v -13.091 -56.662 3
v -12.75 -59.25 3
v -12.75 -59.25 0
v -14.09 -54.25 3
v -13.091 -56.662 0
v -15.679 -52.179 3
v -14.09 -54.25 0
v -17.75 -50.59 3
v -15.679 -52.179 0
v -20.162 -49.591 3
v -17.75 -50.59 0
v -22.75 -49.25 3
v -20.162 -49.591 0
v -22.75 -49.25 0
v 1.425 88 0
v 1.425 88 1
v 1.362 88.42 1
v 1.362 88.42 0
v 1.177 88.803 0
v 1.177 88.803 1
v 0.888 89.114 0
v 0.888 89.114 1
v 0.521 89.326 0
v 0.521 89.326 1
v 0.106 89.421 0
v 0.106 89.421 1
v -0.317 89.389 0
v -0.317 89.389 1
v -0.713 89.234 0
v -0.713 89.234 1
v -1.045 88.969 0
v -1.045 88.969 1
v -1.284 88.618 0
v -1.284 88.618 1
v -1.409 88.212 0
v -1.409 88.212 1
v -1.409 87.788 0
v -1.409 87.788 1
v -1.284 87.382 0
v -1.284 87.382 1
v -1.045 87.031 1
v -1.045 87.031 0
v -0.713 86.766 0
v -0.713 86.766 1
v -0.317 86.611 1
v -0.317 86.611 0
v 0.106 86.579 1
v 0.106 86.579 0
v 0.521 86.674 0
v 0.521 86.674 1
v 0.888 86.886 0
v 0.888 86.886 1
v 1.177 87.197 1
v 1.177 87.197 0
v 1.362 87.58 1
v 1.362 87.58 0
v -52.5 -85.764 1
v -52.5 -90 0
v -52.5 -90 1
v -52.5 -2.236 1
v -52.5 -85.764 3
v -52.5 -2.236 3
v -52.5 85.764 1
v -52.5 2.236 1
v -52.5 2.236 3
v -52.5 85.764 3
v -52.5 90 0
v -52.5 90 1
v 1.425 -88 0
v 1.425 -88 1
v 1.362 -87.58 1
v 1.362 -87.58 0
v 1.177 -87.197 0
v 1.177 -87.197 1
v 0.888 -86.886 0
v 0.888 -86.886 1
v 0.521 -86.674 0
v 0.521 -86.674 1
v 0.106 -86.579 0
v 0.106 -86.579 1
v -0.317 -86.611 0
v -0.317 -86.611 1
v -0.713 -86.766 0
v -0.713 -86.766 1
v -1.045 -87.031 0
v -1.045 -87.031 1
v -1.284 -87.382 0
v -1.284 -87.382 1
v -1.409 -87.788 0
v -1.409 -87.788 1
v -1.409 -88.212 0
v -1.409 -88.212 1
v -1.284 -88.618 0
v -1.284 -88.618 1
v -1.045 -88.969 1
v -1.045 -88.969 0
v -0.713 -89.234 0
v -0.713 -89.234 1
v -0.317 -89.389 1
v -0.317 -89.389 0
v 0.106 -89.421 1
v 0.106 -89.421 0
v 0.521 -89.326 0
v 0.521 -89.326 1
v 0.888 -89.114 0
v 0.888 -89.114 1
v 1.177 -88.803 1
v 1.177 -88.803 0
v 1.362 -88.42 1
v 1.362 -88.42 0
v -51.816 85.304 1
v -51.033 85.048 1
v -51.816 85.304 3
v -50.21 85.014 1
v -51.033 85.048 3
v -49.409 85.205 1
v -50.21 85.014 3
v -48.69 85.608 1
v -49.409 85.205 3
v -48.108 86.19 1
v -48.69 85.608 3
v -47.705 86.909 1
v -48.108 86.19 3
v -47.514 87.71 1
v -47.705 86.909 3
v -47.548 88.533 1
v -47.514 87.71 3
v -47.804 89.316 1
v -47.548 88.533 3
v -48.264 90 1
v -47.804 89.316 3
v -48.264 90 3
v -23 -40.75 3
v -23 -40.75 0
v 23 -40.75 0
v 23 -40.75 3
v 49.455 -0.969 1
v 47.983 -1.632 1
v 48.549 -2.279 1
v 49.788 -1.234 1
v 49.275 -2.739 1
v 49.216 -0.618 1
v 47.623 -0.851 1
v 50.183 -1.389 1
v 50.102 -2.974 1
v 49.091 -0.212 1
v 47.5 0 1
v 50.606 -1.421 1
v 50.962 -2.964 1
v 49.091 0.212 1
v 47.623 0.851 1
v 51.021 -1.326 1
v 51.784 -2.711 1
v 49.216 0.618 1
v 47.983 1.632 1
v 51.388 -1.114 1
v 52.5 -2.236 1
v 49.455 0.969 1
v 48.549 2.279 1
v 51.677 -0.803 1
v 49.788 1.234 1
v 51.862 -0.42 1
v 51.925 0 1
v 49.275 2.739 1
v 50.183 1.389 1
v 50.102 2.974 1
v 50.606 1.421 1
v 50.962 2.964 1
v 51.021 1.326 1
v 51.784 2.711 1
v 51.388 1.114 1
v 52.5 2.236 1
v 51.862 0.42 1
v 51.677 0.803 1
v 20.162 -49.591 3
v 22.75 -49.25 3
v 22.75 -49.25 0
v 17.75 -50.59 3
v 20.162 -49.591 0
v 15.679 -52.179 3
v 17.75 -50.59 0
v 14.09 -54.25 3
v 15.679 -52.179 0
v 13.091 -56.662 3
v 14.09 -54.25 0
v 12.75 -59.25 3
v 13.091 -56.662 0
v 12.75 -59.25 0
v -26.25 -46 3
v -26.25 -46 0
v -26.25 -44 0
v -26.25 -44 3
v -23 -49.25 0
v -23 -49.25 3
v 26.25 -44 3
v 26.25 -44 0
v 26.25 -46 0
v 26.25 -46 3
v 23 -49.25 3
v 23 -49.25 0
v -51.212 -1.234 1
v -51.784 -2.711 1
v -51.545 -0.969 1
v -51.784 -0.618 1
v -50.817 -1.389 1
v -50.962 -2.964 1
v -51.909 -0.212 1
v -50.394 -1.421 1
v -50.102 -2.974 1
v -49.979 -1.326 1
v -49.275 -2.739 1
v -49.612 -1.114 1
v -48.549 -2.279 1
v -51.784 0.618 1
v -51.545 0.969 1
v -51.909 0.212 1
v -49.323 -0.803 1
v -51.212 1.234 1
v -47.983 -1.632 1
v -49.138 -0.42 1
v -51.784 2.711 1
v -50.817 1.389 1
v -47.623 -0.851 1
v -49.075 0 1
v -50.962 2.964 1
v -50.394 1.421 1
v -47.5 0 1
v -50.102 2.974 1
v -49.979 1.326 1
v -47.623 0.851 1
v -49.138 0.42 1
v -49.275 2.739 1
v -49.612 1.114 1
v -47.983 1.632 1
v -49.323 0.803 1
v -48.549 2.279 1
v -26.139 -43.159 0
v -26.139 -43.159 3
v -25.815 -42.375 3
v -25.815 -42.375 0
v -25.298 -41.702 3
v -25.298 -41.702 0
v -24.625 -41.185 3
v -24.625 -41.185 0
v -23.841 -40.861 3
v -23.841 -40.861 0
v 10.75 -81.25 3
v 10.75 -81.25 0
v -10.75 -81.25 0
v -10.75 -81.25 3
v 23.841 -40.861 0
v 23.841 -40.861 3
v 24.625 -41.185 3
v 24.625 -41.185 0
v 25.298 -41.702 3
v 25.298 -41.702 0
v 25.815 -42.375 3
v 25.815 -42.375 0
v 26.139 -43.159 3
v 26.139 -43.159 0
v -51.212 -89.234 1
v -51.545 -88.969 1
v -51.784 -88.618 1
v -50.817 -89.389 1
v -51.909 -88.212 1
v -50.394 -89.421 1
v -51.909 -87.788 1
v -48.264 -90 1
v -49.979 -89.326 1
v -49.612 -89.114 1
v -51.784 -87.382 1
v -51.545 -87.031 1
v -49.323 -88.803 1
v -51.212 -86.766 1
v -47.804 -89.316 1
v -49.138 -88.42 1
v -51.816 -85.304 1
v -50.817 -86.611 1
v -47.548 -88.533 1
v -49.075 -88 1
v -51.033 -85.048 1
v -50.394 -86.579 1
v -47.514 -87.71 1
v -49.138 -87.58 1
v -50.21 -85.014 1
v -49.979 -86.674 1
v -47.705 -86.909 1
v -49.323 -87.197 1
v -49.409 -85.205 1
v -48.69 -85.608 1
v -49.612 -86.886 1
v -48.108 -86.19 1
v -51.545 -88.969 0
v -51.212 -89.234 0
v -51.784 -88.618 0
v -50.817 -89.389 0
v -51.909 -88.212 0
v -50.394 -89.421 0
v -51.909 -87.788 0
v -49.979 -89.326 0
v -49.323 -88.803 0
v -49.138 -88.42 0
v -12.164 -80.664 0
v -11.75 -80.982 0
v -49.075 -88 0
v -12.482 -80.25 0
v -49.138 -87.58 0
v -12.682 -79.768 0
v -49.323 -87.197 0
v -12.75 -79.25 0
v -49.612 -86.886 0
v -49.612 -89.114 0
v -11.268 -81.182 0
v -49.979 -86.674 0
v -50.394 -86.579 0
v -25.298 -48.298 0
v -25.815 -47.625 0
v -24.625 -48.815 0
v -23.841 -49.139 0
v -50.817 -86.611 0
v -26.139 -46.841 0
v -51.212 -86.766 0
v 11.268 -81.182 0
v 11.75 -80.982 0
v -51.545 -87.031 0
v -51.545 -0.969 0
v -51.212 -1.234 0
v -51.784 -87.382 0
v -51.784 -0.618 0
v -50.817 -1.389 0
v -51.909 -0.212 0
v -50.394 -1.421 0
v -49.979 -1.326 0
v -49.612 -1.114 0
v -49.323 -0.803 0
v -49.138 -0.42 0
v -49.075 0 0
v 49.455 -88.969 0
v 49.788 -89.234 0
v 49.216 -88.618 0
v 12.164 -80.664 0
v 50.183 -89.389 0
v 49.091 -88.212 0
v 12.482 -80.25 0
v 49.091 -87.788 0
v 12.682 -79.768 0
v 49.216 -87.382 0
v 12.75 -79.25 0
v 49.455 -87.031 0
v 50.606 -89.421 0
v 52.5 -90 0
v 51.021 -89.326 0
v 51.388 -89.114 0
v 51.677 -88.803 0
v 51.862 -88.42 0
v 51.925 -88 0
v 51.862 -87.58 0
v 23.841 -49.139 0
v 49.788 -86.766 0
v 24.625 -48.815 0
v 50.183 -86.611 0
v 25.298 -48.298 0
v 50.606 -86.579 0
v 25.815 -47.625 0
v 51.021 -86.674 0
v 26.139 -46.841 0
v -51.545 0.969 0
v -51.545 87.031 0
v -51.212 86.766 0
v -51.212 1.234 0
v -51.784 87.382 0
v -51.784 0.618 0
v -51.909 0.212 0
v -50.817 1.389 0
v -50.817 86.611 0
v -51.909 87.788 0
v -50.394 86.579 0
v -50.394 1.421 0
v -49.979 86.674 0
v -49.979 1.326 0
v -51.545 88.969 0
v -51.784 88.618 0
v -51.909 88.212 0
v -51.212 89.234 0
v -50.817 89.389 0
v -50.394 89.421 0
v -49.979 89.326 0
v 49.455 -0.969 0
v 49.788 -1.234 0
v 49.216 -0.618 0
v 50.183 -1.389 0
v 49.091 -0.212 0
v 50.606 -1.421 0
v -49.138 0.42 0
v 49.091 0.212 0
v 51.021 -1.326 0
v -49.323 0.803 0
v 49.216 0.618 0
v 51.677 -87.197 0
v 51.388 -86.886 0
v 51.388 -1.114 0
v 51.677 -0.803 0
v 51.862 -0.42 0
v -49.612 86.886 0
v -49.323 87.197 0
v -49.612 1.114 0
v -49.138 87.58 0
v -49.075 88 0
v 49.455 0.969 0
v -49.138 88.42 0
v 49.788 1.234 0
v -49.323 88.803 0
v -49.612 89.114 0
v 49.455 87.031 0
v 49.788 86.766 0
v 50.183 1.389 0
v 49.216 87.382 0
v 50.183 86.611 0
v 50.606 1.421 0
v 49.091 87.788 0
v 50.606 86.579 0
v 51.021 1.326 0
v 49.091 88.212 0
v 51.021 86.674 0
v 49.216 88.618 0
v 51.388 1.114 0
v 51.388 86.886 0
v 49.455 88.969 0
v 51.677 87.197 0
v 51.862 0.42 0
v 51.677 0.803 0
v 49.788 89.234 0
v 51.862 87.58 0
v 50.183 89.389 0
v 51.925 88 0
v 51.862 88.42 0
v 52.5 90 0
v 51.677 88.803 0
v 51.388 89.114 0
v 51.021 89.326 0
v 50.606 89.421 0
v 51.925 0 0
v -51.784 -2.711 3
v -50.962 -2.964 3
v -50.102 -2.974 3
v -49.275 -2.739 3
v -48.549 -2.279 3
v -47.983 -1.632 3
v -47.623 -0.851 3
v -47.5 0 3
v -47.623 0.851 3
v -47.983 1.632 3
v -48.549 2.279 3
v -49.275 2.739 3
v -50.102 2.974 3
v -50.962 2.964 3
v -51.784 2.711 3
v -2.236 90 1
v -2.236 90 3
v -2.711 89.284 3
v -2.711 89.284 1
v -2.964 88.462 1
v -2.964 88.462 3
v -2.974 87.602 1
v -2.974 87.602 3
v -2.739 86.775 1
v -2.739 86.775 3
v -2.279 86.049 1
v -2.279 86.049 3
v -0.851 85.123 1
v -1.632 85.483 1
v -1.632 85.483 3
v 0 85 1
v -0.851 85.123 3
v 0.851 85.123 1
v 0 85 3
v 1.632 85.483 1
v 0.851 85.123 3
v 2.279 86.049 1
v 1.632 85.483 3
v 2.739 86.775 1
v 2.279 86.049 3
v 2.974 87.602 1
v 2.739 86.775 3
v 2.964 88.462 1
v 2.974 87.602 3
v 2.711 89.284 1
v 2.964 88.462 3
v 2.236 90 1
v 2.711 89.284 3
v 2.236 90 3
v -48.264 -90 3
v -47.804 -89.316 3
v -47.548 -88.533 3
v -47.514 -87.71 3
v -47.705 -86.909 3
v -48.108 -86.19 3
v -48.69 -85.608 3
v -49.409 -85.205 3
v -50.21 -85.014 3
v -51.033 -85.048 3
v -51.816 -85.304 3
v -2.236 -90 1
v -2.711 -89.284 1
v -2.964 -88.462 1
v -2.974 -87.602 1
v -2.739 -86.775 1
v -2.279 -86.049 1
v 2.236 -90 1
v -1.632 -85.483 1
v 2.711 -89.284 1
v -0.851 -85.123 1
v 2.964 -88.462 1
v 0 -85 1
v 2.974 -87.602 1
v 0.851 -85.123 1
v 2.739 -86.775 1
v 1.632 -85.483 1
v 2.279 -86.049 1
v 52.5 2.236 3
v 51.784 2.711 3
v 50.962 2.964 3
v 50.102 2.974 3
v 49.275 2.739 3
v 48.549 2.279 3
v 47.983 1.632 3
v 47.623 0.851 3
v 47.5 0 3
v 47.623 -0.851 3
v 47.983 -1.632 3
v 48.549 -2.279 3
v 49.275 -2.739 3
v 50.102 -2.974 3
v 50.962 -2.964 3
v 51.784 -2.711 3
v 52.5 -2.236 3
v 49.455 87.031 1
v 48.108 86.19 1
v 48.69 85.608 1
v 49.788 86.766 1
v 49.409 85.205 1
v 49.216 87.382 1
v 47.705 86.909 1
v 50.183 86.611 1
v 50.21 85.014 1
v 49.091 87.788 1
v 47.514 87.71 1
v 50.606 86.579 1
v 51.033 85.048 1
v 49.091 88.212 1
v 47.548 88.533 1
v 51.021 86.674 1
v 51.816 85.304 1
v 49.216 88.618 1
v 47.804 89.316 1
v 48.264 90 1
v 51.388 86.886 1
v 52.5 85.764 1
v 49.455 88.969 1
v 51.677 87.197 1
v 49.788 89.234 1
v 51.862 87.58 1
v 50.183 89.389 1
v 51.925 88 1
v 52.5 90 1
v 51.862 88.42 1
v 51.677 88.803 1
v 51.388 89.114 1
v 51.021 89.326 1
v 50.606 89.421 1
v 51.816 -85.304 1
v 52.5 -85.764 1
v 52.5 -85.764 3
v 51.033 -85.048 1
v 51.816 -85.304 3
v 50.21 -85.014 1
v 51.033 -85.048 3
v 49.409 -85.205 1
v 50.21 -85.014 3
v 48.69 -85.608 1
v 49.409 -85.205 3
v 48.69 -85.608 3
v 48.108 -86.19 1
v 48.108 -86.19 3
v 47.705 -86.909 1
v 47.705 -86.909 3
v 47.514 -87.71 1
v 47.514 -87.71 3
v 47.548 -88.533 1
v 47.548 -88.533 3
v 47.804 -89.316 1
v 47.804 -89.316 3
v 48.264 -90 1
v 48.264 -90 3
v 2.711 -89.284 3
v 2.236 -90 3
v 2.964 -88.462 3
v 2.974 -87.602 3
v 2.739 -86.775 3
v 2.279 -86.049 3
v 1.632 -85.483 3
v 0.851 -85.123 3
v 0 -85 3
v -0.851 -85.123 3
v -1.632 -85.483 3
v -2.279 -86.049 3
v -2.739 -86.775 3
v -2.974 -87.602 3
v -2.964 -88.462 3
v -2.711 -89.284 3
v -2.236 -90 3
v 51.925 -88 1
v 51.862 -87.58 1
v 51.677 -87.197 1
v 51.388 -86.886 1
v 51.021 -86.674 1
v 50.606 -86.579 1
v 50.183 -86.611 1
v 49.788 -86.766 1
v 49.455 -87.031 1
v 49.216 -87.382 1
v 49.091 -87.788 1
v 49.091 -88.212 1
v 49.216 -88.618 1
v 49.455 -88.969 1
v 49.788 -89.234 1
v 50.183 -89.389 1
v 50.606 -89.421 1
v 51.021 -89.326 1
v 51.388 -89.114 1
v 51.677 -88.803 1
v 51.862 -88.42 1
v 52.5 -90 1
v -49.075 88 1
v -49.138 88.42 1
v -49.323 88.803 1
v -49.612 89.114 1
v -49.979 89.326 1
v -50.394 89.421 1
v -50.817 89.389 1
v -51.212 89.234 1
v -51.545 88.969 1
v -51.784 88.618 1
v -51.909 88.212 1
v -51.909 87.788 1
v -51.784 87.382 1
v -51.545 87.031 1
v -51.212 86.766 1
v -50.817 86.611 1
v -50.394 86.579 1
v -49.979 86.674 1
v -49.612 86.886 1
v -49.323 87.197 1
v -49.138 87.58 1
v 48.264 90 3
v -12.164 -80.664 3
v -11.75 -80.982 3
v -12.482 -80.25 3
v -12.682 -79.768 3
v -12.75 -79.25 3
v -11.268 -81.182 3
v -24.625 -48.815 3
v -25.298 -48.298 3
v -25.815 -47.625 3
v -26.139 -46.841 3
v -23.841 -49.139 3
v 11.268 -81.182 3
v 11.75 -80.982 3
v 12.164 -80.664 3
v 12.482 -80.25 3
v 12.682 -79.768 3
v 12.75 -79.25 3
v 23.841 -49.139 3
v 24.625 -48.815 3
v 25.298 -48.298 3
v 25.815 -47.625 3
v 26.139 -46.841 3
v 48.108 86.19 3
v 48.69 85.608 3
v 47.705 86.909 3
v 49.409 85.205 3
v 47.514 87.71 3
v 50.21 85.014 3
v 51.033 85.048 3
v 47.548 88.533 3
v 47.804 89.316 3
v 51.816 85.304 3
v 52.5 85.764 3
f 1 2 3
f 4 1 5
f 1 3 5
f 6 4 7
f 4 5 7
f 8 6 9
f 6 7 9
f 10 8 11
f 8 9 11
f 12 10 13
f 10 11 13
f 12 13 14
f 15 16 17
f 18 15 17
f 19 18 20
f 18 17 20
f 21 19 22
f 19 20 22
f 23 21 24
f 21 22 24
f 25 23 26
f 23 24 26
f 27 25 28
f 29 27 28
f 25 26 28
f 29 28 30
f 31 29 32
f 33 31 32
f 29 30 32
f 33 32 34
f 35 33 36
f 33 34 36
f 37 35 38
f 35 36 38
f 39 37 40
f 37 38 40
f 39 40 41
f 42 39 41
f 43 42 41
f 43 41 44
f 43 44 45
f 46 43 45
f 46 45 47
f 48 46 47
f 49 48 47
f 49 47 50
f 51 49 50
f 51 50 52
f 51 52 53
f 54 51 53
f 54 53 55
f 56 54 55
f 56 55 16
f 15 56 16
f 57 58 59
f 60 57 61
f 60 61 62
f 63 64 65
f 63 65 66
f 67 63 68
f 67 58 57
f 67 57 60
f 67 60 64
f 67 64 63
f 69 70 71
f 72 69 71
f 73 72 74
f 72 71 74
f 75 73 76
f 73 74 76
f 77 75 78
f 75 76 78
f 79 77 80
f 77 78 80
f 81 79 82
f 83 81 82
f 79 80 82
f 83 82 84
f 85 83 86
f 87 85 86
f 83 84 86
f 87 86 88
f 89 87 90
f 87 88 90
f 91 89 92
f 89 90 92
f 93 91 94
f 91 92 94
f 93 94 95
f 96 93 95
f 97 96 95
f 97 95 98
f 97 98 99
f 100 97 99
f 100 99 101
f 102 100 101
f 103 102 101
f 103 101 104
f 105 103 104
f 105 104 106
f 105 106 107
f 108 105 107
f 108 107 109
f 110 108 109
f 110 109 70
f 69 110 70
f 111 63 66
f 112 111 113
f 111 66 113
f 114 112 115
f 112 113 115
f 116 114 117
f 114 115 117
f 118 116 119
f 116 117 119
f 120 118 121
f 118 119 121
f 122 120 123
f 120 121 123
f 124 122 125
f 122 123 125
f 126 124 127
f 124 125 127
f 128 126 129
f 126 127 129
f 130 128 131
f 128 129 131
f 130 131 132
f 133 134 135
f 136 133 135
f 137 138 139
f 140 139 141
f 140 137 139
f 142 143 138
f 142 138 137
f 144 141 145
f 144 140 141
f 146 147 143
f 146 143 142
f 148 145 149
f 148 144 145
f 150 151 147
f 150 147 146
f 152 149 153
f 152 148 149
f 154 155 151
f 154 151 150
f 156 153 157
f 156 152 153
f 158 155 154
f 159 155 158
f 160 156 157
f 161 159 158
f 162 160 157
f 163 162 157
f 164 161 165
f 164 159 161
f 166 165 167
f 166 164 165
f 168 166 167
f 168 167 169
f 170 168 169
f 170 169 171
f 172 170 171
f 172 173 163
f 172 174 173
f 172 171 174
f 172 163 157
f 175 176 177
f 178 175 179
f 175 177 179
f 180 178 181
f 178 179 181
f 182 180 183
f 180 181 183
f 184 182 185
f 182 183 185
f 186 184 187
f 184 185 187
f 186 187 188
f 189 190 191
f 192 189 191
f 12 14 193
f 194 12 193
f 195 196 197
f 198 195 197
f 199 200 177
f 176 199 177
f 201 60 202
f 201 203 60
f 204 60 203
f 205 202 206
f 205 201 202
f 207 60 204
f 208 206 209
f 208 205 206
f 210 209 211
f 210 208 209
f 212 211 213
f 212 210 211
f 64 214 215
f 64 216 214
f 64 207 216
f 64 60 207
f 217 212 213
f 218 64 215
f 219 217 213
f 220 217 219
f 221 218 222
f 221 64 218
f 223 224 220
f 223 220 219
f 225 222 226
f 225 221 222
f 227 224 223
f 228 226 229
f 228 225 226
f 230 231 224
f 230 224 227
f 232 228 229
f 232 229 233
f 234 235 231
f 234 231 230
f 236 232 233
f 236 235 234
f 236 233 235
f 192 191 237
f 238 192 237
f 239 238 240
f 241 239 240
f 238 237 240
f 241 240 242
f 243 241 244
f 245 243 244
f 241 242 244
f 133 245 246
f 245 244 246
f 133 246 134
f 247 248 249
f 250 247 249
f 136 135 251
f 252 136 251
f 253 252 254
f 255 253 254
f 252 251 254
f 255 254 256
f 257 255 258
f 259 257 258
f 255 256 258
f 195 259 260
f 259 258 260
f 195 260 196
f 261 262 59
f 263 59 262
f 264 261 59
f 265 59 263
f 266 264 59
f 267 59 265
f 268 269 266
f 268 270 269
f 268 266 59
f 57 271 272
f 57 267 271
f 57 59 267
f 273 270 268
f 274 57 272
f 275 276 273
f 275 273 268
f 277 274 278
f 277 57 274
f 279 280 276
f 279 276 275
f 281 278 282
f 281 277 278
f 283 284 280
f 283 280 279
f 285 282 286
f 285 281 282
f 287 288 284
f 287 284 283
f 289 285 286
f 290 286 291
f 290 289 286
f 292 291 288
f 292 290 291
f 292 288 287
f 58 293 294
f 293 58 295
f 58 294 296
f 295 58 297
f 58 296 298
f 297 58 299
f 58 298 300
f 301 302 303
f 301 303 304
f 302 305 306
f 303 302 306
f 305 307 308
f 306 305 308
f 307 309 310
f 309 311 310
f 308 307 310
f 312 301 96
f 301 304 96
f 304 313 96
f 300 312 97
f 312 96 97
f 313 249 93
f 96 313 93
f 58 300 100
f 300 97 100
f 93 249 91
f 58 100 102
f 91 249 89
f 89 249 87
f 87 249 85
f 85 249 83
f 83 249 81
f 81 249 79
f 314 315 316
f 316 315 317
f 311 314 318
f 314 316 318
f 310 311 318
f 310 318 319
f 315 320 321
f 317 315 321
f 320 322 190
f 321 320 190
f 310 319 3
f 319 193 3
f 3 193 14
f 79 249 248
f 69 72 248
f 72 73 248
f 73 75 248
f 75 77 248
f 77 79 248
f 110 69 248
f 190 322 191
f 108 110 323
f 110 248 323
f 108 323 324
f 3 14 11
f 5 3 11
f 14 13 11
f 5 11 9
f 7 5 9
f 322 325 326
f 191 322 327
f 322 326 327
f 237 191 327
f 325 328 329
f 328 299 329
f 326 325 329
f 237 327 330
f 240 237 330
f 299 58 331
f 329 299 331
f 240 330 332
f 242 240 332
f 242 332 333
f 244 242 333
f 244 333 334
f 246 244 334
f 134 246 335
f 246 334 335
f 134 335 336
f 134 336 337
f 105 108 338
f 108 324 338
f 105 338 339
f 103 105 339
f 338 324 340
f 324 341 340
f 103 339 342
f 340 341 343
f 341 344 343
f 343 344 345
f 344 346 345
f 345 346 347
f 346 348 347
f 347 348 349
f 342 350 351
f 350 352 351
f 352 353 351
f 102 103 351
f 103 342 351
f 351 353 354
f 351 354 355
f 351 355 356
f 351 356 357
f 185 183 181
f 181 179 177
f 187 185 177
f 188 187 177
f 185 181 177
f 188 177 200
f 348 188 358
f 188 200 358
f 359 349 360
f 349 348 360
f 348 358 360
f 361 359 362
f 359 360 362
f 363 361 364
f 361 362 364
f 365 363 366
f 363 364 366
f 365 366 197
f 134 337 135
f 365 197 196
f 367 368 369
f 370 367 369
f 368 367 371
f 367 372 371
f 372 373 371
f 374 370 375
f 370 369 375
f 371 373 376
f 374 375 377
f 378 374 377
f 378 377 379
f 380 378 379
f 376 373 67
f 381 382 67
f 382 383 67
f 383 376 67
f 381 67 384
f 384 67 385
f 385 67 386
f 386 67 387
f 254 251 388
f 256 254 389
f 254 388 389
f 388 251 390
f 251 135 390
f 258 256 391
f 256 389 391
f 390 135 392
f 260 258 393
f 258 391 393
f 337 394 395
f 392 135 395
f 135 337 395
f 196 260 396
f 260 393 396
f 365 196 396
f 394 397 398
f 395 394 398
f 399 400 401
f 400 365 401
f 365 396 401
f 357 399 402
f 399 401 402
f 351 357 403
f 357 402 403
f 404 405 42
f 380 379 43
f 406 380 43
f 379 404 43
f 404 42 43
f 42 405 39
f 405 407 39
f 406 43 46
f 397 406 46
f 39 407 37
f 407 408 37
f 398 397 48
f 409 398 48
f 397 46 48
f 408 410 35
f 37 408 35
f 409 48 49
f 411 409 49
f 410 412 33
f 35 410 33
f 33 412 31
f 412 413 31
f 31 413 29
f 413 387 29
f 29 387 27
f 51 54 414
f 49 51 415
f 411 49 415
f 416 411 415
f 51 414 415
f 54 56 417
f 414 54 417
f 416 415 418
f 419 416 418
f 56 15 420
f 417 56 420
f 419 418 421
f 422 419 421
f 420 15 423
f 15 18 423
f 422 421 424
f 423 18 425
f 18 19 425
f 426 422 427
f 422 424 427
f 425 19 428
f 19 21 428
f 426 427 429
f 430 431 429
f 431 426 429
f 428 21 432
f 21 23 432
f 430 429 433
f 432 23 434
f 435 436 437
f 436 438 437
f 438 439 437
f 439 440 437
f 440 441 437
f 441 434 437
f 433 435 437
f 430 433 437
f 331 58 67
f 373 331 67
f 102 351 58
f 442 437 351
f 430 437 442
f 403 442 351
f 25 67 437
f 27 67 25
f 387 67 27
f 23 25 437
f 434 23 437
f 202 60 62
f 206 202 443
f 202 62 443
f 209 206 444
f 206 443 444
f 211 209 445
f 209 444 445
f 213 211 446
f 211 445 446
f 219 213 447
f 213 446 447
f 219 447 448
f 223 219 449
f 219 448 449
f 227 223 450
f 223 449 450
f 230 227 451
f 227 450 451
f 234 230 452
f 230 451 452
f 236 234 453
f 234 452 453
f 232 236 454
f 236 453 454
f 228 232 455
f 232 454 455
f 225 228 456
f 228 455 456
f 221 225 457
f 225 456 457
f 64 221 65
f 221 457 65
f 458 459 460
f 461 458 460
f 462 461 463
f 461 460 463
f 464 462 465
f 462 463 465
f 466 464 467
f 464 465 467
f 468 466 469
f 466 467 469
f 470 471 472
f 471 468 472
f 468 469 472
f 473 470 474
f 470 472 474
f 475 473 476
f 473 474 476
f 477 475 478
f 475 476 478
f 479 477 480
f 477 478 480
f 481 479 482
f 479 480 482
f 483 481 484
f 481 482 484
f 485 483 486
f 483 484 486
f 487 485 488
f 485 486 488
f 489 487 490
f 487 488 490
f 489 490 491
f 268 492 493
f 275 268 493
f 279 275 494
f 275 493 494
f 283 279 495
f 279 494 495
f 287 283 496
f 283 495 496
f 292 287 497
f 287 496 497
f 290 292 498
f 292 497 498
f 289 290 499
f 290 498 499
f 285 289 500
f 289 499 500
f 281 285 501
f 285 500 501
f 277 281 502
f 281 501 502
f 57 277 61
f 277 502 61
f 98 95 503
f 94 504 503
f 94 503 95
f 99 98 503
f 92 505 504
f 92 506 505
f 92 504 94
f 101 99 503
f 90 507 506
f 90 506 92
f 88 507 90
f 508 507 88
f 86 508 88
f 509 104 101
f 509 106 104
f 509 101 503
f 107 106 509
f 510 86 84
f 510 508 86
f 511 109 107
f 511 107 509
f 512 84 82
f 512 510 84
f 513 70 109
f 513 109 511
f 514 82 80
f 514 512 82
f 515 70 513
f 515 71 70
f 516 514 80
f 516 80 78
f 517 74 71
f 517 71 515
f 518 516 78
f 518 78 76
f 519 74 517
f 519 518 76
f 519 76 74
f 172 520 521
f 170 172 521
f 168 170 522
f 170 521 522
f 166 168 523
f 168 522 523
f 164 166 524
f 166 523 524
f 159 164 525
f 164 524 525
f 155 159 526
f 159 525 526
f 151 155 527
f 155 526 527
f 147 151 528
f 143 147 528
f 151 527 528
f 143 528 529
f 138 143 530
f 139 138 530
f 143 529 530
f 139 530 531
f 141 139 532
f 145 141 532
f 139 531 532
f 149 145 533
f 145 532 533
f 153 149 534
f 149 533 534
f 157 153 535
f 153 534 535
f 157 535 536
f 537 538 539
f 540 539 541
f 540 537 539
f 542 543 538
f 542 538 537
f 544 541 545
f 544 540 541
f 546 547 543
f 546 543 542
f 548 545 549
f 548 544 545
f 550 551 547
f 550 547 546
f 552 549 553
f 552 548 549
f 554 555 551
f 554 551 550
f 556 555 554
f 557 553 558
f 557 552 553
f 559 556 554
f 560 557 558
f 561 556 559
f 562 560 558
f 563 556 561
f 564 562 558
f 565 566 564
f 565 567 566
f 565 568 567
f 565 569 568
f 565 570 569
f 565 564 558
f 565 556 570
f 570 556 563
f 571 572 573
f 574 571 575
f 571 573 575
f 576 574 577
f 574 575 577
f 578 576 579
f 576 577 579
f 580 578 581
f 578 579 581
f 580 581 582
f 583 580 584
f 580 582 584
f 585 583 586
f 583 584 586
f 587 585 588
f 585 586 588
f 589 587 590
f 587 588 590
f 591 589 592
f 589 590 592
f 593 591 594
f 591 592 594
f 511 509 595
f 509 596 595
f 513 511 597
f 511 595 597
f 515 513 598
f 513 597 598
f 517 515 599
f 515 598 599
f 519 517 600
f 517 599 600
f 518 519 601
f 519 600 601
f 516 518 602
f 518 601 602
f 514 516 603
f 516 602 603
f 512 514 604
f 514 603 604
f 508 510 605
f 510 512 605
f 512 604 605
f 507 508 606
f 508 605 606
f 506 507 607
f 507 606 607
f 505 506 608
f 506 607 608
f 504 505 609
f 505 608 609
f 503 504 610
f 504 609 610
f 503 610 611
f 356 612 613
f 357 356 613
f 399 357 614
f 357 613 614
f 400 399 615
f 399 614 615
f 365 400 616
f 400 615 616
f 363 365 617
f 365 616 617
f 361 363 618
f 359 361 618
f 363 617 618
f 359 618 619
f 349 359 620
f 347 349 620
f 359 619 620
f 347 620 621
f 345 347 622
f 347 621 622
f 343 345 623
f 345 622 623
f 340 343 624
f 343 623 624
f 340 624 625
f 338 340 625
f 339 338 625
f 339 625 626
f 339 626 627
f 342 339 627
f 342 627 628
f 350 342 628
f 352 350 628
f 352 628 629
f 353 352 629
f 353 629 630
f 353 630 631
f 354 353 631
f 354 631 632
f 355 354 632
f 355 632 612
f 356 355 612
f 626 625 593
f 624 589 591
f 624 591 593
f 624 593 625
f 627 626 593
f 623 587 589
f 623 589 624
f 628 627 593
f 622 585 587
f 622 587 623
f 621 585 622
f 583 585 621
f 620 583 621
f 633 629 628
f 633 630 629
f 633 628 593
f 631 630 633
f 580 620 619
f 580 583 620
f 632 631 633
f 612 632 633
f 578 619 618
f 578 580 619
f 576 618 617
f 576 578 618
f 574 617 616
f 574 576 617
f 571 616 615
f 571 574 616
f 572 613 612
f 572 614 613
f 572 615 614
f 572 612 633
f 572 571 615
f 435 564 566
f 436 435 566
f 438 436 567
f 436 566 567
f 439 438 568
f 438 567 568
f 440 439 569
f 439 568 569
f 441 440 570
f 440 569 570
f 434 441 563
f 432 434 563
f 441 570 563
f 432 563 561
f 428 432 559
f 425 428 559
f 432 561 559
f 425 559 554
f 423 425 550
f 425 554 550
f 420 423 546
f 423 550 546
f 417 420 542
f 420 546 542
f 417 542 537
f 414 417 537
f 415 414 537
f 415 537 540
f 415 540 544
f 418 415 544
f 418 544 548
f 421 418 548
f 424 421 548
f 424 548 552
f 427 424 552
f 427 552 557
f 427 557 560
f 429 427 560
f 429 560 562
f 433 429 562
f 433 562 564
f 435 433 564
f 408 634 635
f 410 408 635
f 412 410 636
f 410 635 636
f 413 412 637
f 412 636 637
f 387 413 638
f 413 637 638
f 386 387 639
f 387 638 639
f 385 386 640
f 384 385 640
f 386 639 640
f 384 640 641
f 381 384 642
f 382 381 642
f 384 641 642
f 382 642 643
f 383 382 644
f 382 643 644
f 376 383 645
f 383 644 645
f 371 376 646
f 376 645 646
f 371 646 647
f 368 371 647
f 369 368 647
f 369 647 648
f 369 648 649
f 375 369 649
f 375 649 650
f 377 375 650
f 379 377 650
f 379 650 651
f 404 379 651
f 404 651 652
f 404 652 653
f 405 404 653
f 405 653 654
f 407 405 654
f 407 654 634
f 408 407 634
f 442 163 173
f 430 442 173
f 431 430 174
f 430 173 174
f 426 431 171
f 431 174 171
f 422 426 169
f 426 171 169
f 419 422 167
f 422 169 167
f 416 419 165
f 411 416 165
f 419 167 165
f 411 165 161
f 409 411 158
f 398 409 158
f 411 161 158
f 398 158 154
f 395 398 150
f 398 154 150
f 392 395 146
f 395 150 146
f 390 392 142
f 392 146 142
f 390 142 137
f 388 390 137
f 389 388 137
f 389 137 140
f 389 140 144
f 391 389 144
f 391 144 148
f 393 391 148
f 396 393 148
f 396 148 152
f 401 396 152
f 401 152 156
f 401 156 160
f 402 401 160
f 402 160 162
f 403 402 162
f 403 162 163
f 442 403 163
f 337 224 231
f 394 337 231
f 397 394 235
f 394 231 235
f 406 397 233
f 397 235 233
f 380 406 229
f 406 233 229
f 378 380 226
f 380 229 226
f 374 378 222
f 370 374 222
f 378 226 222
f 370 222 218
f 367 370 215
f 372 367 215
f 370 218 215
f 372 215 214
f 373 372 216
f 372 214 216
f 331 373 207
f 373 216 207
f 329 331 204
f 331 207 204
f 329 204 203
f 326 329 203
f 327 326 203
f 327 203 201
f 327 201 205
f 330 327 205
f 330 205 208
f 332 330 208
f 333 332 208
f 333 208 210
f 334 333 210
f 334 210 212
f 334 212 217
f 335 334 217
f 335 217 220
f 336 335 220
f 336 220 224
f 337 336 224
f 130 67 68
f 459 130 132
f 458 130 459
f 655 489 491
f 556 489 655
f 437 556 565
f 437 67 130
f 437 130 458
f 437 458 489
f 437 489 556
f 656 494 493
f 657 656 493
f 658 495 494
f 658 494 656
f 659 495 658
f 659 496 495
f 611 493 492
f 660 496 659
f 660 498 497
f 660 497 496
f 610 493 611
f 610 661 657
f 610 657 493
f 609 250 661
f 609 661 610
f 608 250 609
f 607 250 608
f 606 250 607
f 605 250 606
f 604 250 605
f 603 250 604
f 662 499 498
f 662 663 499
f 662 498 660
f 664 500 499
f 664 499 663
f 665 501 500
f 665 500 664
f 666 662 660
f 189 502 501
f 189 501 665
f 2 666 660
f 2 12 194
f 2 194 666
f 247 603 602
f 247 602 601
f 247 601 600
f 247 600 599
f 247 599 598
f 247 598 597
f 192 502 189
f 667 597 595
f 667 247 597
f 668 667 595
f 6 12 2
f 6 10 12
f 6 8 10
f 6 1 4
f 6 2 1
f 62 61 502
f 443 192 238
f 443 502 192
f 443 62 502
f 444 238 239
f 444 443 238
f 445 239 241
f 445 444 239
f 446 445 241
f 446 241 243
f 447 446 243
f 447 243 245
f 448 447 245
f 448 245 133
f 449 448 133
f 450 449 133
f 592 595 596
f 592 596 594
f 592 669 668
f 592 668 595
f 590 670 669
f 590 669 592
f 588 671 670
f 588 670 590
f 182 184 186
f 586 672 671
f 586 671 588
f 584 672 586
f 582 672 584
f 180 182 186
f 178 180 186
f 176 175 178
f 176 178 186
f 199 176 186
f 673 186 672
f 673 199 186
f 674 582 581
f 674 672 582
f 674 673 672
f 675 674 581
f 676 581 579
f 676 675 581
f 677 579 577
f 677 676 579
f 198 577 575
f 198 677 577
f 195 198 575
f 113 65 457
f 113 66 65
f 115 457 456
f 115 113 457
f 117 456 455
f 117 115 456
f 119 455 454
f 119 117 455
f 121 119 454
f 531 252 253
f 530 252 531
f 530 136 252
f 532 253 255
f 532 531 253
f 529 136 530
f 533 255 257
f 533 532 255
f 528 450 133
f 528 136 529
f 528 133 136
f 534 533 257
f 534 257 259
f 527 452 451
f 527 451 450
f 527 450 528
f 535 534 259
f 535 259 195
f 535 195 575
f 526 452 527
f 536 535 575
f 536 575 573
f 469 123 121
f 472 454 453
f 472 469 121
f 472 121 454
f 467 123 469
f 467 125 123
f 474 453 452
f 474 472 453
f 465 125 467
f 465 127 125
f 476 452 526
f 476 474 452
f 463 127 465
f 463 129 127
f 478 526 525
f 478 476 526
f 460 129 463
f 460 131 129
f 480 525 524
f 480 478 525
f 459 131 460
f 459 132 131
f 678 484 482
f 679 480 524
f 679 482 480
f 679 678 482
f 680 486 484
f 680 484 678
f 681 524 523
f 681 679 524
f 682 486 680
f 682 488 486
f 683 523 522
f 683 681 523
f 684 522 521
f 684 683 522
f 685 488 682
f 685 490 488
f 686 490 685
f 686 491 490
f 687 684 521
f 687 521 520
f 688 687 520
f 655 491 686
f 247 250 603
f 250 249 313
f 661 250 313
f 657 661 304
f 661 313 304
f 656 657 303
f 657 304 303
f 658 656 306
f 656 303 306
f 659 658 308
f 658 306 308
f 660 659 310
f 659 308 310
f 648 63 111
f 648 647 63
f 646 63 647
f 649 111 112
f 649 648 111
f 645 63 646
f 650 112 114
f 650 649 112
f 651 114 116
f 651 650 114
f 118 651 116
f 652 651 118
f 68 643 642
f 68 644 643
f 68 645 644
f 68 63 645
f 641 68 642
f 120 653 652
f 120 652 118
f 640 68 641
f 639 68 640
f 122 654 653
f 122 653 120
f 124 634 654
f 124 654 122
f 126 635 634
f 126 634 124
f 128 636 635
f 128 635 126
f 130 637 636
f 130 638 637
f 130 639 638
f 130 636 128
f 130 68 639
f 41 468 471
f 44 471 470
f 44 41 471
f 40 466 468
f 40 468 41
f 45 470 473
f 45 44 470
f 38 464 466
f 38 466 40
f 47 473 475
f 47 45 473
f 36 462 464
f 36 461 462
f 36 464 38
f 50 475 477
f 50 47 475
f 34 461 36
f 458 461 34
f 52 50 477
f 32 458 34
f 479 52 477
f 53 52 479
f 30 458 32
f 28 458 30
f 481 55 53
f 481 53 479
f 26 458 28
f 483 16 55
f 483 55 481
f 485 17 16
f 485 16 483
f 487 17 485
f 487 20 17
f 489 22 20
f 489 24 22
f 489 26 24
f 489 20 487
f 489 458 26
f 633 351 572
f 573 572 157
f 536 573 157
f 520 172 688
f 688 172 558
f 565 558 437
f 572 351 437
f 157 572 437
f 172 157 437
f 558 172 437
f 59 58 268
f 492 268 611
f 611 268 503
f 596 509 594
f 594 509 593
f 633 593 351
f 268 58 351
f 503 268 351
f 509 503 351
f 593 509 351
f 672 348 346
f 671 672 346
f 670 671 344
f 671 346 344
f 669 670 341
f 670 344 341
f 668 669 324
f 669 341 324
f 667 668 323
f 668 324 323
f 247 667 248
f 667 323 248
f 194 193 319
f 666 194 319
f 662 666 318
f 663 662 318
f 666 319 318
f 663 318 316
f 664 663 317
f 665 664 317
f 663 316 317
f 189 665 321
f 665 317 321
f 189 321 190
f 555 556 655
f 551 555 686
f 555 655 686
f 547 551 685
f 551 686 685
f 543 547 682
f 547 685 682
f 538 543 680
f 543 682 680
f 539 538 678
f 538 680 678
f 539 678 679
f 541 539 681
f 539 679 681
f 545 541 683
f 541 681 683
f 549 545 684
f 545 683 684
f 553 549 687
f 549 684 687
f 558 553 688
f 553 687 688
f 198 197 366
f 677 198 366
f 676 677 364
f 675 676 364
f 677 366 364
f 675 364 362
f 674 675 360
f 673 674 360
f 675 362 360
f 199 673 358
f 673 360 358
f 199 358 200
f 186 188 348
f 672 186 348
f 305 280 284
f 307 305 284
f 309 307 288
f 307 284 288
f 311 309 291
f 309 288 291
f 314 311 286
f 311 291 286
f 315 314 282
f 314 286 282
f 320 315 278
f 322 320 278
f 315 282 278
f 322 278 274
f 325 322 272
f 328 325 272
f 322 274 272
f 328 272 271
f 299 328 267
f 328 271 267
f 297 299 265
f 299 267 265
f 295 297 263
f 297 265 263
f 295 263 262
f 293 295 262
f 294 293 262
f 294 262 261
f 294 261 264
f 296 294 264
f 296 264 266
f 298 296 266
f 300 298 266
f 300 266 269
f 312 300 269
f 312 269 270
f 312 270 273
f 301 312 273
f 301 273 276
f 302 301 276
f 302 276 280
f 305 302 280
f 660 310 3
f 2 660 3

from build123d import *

# Parameters (mm, degrees)
SKETCH_1_W          = 105
SKETCH_1_H          = 180
EXTRUDE_1_DEPTH     = 3
CUT_EXTRUDE_1_DEPTH = 10
SKETCH_3_R          = 3
CUT_EXTRUDE_2_DEPTH = 2
SKETCH_4_R          = 1.425
CUT_EXTRUDE_3_DEPTH = 2


with BuildPart() as part:
    # Эскиз1 → Бобышка-Вытянуть1 (new body)
    with BuildSketch(Plane.XY):
        Rectangle(SKETCH_1_W, SKETCH_1_H)
    extrude(amount=EXTRUDE_1_DEPTH)

    # Эскиз2 → Вырез-Вытянуть1 (cut)
    with BuildSketch(Plane(origin=(0, 0, 0), x_dir=(-1, 0, 0), z_dir=(0, 0, -1))):
        with BuildLine():
            Line((-26.25, -44), (-26.25, -46))
            ThreePointArc((-26.25, -46), (-25.298097039, -48.298097039), (-23, -49.25))
            Line((-23, -49.25), (-22.75, -49.25))
            ThreePointArc((-22.75, -49.25), (-15.678932188, -52.178932188), (-12.75, -59.25))
            Line((-12.75, -59.25), (-12.75, -79.25))
            ThreePointArc((-12.75, -79.25), (-12.164213562, -80.664213562), (-10.75, -81.25))
            Line((-10.75, -81.25), (10.75, -81.25))
            ThreePointArc((10.75, -81.25), (12.164213562, -80.664213562), (12.75, -79.25))
            Line((12.75, -79.25), (12.75, -59.25))
            ThreePointArc((12.75, -59.25), (15.678932188, -52.178932188), (22.75, -49.25))
            Line((22.75, -49.25), (23, -49.25))
            ThreePointArc((23, -49.25), (25.298097039, -48.298097039), (26.25, -46))
            Line((26.25, -46), (26.25, -44))
            ThreePointArc((26.25, -44), (25.298097039, -41.701902961), (23, -40.75))
            Line((23, -40.75), (-23, -40.75))
            ThreePointArc((-23, -40.75), (-25.298097039, -41.701902961), (-26.25, -44))
        make_face()
    extrude(amount=-CUT_EXTRUDE_1_DEPTH, mode=Mode.SUBTRACT)

    # Эскиз3 → Вырез-Вытянуть2 (cut)
    with BuildSketch(Plane.XY.offset(3)):
        with Locations((-50.5, 88)):
            Circle(SKETCH_3_R)
        with Locations((0, 88)):
            Circle(SKETCH_3_R)
        with Locations((50.5, 88)):
            Circle(SKETCH_3_R)
        with Locations((50.5, 0)):
            Circle(SKETCH_3_R)
        with Locations((50.5, -88)):
            Circle(SKETCH_3_R)
        with Locations((0, -88)):
            Circle(SKETCH_3_R)
        with Locations((-50.5, -88)):
            Circle(SKETCH_3_R)
        with Locations((-50.5, 0)):
            Circle(SKETCH_3_R)
    extrude(amount=-CUT_EXTRUDE_2_DEPTH, mode=Mode.SUBTRACT)

    # Эскиз4 → Вырез-Вытянуть3 (cut)
    with BuildSketch(Plane.XY.offset(1)):
        with Locations((-50.5, 88)):
            Circle(SKETCH_4_R)
        with Locations((0, 88)):
            Circle(SKETCH_4_R)
        with Locations((50.5, 88)):
            Circle(SKETCH_4_R)
        with Locations((50.5, 0)):
            Circle(SKETCH_4_R)
        with Locations((50.5, -88)):
            Circle(SKETCH_4_R)
        with Locations((0, -88)):
            Circle(SKETCH_4_R)
        with Locations((-50.5, -88)):
            Circle(SKETCH_4_R)
        with Locations((-50.5, 0)):
            Circle(SKETCH_4_R)
    extrude(amount=-CUT_EXTRUDE_3_DEPTH, mode=Mode.SUBTRACT)


solid = part.part
